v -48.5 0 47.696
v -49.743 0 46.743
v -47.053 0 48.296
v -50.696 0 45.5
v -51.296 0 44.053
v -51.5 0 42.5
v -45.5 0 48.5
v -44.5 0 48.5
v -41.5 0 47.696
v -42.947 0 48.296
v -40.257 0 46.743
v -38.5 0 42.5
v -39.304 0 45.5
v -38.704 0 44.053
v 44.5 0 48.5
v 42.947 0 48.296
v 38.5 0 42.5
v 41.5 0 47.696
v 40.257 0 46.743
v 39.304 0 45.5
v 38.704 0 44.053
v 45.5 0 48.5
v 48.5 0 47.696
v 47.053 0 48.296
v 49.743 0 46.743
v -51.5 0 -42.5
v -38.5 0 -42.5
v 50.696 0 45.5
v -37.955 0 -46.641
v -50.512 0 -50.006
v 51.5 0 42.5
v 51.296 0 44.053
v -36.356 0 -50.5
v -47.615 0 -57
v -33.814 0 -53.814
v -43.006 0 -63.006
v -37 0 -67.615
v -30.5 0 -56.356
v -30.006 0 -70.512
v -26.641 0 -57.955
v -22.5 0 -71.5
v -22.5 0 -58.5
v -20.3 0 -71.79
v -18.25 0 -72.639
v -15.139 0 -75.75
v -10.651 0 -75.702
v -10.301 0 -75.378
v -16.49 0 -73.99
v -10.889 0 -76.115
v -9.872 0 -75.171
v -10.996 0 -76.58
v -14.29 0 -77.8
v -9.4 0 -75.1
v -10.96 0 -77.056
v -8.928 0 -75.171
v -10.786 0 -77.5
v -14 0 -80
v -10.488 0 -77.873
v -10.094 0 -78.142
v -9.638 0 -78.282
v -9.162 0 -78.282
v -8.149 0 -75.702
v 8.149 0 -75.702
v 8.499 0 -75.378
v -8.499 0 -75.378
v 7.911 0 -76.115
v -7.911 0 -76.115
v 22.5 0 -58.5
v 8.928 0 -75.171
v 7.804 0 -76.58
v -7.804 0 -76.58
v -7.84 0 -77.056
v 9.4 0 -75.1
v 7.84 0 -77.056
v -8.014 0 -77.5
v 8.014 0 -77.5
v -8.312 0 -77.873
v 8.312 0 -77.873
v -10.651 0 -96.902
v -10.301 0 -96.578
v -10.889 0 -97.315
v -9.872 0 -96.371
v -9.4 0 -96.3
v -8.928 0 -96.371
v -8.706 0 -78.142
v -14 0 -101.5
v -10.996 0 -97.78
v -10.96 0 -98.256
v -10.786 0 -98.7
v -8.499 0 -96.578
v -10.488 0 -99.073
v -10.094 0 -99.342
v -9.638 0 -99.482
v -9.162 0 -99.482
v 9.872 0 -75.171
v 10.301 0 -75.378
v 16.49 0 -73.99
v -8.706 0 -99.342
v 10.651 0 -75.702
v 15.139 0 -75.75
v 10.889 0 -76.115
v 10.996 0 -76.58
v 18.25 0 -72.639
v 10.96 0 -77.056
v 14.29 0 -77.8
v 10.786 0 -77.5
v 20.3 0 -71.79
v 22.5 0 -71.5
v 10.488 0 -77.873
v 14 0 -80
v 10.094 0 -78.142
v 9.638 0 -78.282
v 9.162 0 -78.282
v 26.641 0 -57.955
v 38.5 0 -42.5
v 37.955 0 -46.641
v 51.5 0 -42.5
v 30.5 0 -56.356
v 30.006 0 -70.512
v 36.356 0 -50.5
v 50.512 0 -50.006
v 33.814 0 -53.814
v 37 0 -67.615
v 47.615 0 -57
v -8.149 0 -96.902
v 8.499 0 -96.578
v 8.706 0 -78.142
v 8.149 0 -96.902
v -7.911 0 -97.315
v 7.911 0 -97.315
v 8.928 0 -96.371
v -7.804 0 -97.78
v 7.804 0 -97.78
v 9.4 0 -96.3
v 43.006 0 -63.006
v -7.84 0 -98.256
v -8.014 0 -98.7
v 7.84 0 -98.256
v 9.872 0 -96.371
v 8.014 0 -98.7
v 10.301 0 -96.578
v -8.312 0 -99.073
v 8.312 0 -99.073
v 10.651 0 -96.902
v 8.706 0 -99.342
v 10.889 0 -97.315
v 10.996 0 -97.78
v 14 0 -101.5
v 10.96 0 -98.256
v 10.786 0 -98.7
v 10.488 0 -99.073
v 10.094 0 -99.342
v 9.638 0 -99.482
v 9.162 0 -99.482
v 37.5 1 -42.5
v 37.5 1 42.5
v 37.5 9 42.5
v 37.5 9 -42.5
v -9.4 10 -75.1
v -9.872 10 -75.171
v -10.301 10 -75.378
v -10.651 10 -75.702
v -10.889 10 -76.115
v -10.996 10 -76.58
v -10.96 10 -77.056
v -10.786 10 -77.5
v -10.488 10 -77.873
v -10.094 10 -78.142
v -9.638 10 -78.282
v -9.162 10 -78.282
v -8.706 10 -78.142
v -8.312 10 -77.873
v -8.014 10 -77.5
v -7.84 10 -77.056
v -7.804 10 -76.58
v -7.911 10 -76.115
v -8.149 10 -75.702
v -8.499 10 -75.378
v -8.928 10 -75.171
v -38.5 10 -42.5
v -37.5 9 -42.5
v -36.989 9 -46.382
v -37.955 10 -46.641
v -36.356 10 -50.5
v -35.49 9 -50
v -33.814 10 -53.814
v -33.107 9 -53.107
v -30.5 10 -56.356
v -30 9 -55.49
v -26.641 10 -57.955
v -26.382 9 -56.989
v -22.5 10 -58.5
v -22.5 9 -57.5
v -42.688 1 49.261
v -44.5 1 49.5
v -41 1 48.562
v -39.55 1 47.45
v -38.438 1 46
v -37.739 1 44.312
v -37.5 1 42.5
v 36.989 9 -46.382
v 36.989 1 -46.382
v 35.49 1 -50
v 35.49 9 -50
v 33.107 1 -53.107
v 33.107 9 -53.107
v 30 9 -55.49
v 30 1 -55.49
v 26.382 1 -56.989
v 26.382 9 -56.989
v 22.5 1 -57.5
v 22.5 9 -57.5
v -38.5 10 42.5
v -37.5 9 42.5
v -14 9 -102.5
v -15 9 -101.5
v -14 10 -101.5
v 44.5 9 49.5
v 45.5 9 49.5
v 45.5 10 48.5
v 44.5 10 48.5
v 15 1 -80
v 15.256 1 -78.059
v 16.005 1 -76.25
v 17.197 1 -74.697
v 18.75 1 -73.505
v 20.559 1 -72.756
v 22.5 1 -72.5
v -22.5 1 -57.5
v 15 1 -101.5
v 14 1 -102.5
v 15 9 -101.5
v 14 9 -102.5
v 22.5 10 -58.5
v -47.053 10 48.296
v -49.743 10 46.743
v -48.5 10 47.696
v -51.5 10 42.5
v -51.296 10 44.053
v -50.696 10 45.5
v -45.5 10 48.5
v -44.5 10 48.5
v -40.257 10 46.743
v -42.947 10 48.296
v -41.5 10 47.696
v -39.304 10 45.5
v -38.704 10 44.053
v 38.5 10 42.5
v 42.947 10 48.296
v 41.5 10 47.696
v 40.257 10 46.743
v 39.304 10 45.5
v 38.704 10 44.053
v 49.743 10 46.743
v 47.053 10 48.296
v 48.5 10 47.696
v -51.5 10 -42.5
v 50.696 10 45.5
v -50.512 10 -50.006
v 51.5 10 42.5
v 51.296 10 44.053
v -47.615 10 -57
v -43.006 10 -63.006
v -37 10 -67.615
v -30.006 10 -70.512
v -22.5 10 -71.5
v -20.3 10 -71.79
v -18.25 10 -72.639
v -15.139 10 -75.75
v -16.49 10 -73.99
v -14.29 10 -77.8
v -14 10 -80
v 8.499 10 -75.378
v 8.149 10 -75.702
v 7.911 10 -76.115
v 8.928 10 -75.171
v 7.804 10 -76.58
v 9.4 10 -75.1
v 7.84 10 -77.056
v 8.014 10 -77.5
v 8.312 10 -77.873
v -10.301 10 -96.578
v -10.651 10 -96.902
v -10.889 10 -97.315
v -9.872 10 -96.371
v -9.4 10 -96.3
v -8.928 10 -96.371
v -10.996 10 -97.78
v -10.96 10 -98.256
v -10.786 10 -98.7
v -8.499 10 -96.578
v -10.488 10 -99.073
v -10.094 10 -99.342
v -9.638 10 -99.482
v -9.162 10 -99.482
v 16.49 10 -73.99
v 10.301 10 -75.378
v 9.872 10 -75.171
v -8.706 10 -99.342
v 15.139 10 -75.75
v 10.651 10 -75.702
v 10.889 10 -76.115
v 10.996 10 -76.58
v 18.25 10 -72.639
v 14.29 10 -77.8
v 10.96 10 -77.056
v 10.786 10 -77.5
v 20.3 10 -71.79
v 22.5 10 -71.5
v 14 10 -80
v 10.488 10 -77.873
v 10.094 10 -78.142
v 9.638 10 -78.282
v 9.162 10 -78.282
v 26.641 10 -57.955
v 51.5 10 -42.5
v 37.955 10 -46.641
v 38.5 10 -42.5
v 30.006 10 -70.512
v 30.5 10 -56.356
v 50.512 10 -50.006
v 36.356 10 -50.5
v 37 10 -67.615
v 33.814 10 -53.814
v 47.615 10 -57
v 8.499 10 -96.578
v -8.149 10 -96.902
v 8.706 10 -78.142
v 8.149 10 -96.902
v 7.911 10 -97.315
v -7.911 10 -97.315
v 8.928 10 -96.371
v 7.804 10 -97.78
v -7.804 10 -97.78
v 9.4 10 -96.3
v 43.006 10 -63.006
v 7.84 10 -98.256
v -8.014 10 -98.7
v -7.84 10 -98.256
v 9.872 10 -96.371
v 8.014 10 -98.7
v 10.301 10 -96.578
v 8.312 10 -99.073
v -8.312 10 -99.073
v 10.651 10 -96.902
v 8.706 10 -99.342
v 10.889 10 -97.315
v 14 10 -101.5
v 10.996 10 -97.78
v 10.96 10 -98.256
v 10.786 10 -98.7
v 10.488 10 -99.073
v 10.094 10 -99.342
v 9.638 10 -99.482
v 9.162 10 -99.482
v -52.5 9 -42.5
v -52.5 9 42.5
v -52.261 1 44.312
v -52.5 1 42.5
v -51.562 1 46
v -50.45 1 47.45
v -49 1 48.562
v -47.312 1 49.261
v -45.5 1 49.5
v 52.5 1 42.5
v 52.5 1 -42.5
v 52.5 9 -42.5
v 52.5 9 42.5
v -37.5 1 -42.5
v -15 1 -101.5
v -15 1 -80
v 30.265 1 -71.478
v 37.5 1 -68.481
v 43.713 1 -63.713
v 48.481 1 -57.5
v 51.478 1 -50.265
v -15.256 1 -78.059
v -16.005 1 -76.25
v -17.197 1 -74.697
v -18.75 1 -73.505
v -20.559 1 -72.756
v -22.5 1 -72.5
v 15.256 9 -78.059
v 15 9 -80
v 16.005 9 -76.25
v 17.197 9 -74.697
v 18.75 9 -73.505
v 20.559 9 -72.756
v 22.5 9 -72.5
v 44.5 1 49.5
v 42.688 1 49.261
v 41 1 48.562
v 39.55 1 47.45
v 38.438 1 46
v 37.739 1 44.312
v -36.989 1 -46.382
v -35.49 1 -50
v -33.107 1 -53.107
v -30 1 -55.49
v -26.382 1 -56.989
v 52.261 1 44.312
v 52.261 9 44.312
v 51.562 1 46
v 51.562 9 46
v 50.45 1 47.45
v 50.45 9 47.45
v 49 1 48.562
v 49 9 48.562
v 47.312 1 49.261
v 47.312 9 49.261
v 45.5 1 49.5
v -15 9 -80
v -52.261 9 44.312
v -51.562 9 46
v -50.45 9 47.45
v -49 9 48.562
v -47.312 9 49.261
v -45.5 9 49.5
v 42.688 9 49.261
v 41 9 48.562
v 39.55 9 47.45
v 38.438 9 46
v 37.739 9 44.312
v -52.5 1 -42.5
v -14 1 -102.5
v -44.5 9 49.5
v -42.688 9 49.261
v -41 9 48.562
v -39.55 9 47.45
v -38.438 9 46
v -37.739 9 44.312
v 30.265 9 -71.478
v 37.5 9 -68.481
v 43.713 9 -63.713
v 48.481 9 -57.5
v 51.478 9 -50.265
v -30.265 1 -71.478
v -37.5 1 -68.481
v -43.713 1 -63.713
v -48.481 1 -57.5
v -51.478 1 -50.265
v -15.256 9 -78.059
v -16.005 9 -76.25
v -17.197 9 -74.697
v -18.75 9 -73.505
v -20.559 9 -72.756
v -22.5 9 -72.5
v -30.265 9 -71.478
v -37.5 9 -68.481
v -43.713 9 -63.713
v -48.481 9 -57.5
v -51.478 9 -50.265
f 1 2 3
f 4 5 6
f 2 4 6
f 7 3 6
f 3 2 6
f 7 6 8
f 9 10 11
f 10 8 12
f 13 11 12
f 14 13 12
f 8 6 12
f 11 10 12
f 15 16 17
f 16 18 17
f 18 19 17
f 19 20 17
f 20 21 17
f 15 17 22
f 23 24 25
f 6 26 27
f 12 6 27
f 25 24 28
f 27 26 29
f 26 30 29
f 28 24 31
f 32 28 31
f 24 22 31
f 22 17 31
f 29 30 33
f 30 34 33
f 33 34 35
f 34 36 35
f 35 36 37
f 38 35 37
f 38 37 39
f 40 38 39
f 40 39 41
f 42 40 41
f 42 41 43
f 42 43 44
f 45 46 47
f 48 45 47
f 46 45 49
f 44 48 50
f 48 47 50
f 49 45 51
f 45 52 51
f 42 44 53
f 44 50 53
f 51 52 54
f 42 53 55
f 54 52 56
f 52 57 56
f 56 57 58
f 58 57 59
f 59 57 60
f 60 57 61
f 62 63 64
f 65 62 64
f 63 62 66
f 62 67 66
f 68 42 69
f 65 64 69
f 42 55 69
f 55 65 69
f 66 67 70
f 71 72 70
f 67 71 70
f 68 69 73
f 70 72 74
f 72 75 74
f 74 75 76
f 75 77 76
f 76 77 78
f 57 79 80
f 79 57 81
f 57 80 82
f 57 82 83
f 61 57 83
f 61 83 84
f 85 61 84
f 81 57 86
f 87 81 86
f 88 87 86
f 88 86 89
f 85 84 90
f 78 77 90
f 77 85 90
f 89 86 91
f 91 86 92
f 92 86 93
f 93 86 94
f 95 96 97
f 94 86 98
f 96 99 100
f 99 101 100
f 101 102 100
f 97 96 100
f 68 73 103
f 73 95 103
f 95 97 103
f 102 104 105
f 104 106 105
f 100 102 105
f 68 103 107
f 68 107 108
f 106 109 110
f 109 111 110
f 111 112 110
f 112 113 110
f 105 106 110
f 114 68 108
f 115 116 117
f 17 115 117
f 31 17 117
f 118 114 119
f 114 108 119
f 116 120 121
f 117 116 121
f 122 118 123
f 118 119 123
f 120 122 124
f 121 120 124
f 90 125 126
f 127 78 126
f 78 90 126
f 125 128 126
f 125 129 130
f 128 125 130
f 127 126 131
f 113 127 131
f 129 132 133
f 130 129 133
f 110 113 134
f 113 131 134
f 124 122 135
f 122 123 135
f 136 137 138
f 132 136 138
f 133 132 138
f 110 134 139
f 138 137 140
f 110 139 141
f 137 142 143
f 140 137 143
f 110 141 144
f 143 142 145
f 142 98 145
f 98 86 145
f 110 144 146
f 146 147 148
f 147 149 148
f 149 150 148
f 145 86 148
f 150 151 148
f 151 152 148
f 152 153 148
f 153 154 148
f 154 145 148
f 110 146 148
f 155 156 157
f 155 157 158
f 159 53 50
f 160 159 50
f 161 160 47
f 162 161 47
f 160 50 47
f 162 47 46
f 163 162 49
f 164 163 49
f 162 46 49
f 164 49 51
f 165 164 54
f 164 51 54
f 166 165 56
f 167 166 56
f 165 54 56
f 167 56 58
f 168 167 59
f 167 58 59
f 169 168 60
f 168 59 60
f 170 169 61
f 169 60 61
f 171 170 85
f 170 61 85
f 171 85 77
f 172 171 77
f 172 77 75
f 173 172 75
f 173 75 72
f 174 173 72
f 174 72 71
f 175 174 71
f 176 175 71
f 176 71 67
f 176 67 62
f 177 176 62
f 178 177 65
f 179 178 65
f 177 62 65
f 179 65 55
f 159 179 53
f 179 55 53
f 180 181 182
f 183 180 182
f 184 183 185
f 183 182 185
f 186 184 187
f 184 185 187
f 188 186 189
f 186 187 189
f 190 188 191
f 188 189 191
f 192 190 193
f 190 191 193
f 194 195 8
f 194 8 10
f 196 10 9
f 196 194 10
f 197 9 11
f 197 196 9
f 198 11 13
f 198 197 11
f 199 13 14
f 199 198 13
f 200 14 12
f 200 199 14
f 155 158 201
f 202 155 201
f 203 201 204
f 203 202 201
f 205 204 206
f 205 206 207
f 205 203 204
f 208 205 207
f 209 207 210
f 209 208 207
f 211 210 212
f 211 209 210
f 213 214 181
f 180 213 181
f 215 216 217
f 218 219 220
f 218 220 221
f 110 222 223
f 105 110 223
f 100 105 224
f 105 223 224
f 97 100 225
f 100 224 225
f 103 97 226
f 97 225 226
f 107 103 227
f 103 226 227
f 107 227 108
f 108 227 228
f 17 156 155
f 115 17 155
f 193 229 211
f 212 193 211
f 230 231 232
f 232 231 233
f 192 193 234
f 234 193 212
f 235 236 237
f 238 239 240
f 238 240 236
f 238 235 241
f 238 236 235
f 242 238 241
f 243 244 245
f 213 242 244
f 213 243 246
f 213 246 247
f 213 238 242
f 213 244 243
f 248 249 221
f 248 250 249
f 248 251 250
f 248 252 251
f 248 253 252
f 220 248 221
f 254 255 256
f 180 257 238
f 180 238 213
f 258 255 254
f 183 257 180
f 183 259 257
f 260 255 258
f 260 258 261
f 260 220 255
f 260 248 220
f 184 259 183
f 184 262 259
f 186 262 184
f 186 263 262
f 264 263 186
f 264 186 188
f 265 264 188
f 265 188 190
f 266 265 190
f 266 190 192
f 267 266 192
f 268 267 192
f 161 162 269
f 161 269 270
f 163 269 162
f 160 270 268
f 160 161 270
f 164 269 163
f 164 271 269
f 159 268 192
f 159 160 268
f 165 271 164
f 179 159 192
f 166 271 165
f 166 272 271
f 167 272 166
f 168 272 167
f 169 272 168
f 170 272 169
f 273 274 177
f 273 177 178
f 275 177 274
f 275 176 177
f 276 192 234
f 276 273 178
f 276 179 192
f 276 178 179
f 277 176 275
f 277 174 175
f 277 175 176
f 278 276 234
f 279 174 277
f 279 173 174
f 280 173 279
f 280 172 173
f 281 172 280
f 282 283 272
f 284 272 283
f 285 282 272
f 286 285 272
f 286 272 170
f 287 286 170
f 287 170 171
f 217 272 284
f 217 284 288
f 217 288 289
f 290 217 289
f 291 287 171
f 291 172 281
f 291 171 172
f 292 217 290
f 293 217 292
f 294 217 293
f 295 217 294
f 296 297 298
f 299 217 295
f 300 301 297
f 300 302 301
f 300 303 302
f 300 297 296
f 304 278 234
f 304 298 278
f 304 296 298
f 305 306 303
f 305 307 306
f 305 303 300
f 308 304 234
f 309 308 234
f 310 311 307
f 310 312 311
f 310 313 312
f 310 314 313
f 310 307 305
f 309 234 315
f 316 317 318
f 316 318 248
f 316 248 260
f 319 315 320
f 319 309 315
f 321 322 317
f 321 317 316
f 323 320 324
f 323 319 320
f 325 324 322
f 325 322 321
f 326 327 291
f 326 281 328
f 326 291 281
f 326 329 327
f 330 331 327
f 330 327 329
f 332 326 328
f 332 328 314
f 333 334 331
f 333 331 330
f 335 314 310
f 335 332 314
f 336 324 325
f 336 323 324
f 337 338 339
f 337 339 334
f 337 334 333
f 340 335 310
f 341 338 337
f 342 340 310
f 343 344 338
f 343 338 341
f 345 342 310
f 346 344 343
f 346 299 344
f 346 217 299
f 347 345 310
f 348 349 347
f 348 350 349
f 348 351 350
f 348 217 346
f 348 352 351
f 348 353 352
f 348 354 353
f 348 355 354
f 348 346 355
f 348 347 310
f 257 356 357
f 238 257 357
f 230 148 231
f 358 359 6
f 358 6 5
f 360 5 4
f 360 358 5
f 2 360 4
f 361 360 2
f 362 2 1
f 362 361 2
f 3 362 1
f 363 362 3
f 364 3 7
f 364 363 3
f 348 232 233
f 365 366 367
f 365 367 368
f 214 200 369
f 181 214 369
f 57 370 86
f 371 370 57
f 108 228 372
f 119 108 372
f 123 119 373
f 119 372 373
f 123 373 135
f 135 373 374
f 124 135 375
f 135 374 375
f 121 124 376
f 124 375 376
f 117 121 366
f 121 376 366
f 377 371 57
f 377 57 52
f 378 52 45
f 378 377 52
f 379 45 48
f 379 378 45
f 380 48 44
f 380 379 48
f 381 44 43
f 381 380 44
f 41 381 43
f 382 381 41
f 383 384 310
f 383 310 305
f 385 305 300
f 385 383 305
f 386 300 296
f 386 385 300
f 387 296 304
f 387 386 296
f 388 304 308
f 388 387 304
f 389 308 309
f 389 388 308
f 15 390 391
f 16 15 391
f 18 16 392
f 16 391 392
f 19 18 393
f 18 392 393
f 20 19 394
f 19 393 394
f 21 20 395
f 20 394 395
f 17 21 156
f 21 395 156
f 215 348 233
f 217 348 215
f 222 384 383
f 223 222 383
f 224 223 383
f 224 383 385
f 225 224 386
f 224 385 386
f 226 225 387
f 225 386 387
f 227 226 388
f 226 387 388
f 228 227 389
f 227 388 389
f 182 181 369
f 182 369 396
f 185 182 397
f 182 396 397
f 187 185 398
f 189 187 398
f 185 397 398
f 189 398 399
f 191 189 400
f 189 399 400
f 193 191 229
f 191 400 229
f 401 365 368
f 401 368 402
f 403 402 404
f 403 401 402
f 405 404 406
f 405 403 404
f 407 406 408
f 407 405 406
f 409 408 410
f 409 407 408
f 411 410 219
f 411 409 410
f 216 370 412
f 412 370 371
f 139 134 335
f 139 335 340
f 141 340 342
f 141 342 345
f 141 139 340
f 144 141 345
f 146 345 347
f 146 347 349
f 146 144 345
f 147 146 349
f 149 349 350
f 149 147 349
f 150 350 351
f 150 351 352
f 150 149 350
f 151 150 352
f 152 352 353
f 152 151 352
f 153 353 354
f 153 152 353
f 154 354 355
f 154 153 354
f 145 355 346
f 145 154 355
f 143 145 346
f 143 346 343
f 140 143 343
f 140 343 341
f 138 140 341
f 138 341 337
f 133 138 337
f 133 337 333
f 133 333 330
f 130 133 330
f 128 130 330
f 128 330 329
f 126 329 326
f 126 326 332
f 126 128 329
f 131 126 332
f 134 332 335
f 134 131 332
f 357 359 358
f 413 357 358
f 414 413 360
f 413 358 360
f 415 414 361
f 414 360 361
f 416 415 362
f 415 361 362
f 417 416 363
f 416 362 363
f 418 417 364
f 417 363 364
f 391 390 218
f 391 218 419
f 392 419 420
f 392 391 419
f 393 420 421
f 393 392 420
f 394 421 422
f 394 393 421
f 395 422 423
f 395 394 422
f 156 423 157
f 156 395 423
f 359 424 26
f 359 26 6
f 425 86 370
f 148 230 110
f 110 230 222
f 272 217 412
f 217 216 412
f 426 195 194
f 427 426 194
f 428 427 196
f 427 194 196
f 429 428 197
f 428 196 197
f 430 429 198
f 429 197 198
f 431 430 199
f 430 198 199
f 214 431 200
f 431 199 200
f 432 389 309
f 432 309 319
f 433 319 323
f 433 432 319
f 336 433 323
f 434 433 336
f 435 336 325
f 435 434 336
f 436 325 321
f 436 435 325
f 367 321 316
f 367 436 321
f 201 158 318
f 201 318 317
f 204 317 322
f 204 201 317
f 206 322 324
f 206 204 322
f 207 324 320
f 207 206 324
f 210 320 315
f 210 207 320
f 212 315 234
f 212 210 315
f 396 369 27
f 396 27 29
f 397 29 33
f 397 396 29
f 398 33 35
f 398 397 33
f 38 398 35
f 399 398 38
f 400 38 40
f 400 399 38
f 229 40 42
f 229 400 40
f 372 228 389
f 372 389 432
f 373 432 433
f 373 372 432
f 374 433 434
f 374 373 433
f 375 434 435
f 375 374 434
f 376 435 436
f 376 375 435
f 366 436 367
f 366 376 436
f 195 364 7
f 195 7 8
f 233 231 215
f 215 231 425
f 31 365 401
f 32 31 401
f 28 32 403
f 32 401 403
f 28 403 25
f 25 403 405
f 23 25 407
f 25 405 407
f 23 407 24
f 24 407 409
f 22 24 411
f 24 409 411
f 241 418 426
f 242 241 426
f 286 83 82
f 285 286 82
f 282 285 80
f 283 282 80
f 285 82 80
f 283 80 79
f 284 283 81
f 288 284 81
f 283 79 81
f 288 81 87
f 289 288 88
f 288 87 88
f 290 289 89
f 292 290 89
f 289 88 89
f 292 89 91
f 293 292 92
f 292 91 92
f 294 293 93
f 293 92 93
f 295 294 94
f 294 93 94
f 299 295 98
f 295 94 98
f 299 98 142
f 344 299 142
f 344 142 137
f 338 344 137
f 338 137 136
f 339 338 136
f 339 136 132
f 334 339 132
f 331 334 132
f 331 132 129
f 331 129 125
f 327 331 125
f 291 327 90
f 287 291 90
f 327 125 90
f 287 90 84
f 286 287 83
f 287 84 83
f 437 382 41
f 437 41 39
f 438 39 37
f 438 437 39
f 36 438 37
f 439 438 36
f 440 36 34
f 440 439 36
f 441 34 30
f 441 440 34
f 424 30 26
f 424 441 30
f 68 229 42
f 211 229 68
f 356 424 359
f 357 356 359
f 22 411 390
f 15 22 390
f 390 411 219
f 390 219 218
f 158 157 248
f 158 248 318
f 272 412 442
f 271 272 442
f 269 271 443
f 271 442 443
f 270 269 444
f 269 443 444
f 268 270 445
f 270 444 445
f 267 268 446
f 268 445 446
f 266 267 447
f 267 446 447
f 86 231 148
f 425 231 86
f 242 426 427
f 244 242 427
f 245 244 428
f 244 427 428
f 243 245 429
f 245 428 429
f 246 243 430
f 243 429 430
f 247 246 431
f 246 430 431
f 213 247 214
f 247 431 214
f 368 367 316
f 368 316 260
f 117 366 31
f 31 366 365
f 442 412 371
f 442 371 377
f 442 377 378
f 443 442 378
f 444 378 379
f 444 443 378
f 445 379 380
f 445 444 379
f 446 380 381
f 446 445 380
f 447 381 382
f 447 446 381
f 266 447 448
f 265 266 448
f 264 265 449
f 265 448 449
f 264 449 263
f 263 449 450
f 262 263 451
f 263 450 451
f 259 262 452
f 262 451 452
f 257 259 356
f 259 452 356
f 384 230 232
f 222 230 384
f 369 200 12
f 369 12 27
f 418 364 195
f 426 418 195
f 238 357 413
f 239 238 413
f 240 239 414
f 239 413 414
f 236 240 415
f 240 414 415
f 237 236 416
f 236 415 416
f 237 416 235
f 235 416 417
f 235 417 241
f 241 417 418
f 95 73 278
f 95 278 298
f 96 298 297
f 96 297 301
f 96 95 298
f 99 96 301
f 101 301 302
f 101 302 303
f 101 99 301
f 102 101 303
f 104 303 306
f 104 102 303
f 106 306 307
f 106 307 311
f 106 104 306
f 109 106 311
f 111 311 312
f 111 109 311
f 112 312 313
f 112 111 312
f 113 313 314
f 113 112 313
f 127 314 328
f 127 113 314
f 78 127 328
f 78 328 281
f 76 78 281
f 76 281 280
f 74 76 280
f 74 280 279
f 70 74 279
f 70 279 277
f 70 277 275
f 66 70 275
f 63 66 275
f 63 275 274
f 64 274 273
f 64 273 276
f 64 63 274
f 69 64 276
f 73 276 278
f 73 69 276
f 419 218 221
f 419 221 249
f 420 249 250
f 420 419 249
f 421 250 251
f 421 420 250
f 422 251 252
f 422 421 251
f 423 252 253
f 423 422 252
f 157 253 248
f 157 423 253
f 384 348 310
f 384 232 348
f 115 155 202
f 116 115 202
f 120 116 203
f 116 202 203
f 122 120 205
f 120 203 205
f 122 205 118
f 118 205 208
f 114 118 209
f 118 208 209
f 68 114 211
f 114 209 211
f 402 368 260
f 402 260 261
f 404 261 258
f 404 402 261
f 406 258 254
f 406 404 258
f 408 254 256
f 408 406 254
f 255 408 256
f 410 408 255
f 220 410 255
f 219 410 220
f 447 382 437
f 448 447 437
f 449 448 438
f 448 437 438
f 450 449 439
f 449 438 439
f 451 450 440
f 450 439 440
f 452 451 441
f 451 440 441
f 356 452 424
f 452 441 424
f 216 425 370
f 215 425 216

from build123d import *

# Parameters (mm, degrees)
SKETCH1_R           = 1.6
BOSS_EXTRUDE1_DEPTH = 10
FILLET1_R           = 7.5
CHAMFER1_SIZE       = 1


with BuildPart() as part:
    # Sketch1 → Boss-Extrude1 (new body)
    with BuildSketch(Plane(origin=(0, 0, 0), x_dir=(1, 0, 0), z_dir=(0, 1, 0))):
        with BuildLine():
            Line((22.5, 57.5), (0, 57.5))
            Line((0, 57.5), (0, 102.5))
            Line((0, 102.5), (15, 102.5))
            Line((15, 102.5), (15, 72.5))
            Line((15, 72.5), (22.5, 72.5))
            ThreePointArc((22.5, 72.5), (43.713203436, 63.713203436), (52.5, 42.5))
            Line((52.5, 42.5), (52.5, -42.5))
            ThreePointArc((52.5, -42.5), (50.449747468, -47.449747468), (45.5, -49.5))
            Line((45.5, -49.5), (44.5, -49.5))
            ThreePointArc((44.5, -49.5), (39.550252532, -47.449747468), (37.5, -42.5))
            Line((37.5, -42.5), (37.5, 42.5))
            ThreePointArc((37.5, 42.5), (33.106601718, 53.106601718), (22.5, 57.5))
        make_face()
        with Locations(Location((9.4, 97.9, 0), (0, 0, 270))):
            Circle(SKETCH1_R, mode=Mode.SUBTRACT)
        with Locations(Location((9.4, 76.7, 0), (0, 0, 270))):
            Circle(SKETCH1_R, mode=Mode.SUBTRACT)
    extrude(amount=BOSS_EXTRUDE1_DEPTH)

    # Fillet1
    fillet1_edges = [part.edges().sort_by_distance(p)[0] for p in [
        (15, 5, -72.5),
    ]]
    fillet(fillet1_edges, radius=FILLET1_R - 0.0001)  # a hair under: the kernel refuses the full size

    # Chamfer1
    chamfer1_edges = [part.edges().sort_by_distance(p)[0] for p in [
        (7.5, 0, -102.5),
        (33.106601718, 10, -53.106601718),
        (43.713203436, 0, -63.713203436),
        (52.5, 0, 0),
        (50.449747468, 0, 47.449747468),
        (45, 0, 49.5),
        (39.550252532, 0, 47.449747468),
        (37.5, 0, 0),
        (33.106601718, 0, -53.106601718),
        (11.25, 0, -57.5),
        (37.5, 10, 0),
        (15, 5, -102.5),
        (39.550252532, 10, 47.449747468),
        (45, 10, 49.5),
        (50.449747468, 10, 47.449747468),
        (52.5, 10, 0),
        (43.713203436, 10, -63.713203436),
        (15, 0, -91.24995),
        (15, 10, -91.24995),
        (17.196669852, 0, -74.696669852),
        (17.196669852, 10, -74.696669852),
        (7.5, 10, -102.5),
        (11.25, 10, -57.5),
    ]]
    chamfer(chamfer1_edges, length=CHAMFER1_SIZE)

    # Mirror1: part across plane


with BuildPart() as part_1:
    add(part.part)
    add(part.part.mirror(Plane(origin=(0, 10, -57.5), x_dir=(0, 0, 1), z_dir=(1, 0, 0))))


solid = part_1.part
